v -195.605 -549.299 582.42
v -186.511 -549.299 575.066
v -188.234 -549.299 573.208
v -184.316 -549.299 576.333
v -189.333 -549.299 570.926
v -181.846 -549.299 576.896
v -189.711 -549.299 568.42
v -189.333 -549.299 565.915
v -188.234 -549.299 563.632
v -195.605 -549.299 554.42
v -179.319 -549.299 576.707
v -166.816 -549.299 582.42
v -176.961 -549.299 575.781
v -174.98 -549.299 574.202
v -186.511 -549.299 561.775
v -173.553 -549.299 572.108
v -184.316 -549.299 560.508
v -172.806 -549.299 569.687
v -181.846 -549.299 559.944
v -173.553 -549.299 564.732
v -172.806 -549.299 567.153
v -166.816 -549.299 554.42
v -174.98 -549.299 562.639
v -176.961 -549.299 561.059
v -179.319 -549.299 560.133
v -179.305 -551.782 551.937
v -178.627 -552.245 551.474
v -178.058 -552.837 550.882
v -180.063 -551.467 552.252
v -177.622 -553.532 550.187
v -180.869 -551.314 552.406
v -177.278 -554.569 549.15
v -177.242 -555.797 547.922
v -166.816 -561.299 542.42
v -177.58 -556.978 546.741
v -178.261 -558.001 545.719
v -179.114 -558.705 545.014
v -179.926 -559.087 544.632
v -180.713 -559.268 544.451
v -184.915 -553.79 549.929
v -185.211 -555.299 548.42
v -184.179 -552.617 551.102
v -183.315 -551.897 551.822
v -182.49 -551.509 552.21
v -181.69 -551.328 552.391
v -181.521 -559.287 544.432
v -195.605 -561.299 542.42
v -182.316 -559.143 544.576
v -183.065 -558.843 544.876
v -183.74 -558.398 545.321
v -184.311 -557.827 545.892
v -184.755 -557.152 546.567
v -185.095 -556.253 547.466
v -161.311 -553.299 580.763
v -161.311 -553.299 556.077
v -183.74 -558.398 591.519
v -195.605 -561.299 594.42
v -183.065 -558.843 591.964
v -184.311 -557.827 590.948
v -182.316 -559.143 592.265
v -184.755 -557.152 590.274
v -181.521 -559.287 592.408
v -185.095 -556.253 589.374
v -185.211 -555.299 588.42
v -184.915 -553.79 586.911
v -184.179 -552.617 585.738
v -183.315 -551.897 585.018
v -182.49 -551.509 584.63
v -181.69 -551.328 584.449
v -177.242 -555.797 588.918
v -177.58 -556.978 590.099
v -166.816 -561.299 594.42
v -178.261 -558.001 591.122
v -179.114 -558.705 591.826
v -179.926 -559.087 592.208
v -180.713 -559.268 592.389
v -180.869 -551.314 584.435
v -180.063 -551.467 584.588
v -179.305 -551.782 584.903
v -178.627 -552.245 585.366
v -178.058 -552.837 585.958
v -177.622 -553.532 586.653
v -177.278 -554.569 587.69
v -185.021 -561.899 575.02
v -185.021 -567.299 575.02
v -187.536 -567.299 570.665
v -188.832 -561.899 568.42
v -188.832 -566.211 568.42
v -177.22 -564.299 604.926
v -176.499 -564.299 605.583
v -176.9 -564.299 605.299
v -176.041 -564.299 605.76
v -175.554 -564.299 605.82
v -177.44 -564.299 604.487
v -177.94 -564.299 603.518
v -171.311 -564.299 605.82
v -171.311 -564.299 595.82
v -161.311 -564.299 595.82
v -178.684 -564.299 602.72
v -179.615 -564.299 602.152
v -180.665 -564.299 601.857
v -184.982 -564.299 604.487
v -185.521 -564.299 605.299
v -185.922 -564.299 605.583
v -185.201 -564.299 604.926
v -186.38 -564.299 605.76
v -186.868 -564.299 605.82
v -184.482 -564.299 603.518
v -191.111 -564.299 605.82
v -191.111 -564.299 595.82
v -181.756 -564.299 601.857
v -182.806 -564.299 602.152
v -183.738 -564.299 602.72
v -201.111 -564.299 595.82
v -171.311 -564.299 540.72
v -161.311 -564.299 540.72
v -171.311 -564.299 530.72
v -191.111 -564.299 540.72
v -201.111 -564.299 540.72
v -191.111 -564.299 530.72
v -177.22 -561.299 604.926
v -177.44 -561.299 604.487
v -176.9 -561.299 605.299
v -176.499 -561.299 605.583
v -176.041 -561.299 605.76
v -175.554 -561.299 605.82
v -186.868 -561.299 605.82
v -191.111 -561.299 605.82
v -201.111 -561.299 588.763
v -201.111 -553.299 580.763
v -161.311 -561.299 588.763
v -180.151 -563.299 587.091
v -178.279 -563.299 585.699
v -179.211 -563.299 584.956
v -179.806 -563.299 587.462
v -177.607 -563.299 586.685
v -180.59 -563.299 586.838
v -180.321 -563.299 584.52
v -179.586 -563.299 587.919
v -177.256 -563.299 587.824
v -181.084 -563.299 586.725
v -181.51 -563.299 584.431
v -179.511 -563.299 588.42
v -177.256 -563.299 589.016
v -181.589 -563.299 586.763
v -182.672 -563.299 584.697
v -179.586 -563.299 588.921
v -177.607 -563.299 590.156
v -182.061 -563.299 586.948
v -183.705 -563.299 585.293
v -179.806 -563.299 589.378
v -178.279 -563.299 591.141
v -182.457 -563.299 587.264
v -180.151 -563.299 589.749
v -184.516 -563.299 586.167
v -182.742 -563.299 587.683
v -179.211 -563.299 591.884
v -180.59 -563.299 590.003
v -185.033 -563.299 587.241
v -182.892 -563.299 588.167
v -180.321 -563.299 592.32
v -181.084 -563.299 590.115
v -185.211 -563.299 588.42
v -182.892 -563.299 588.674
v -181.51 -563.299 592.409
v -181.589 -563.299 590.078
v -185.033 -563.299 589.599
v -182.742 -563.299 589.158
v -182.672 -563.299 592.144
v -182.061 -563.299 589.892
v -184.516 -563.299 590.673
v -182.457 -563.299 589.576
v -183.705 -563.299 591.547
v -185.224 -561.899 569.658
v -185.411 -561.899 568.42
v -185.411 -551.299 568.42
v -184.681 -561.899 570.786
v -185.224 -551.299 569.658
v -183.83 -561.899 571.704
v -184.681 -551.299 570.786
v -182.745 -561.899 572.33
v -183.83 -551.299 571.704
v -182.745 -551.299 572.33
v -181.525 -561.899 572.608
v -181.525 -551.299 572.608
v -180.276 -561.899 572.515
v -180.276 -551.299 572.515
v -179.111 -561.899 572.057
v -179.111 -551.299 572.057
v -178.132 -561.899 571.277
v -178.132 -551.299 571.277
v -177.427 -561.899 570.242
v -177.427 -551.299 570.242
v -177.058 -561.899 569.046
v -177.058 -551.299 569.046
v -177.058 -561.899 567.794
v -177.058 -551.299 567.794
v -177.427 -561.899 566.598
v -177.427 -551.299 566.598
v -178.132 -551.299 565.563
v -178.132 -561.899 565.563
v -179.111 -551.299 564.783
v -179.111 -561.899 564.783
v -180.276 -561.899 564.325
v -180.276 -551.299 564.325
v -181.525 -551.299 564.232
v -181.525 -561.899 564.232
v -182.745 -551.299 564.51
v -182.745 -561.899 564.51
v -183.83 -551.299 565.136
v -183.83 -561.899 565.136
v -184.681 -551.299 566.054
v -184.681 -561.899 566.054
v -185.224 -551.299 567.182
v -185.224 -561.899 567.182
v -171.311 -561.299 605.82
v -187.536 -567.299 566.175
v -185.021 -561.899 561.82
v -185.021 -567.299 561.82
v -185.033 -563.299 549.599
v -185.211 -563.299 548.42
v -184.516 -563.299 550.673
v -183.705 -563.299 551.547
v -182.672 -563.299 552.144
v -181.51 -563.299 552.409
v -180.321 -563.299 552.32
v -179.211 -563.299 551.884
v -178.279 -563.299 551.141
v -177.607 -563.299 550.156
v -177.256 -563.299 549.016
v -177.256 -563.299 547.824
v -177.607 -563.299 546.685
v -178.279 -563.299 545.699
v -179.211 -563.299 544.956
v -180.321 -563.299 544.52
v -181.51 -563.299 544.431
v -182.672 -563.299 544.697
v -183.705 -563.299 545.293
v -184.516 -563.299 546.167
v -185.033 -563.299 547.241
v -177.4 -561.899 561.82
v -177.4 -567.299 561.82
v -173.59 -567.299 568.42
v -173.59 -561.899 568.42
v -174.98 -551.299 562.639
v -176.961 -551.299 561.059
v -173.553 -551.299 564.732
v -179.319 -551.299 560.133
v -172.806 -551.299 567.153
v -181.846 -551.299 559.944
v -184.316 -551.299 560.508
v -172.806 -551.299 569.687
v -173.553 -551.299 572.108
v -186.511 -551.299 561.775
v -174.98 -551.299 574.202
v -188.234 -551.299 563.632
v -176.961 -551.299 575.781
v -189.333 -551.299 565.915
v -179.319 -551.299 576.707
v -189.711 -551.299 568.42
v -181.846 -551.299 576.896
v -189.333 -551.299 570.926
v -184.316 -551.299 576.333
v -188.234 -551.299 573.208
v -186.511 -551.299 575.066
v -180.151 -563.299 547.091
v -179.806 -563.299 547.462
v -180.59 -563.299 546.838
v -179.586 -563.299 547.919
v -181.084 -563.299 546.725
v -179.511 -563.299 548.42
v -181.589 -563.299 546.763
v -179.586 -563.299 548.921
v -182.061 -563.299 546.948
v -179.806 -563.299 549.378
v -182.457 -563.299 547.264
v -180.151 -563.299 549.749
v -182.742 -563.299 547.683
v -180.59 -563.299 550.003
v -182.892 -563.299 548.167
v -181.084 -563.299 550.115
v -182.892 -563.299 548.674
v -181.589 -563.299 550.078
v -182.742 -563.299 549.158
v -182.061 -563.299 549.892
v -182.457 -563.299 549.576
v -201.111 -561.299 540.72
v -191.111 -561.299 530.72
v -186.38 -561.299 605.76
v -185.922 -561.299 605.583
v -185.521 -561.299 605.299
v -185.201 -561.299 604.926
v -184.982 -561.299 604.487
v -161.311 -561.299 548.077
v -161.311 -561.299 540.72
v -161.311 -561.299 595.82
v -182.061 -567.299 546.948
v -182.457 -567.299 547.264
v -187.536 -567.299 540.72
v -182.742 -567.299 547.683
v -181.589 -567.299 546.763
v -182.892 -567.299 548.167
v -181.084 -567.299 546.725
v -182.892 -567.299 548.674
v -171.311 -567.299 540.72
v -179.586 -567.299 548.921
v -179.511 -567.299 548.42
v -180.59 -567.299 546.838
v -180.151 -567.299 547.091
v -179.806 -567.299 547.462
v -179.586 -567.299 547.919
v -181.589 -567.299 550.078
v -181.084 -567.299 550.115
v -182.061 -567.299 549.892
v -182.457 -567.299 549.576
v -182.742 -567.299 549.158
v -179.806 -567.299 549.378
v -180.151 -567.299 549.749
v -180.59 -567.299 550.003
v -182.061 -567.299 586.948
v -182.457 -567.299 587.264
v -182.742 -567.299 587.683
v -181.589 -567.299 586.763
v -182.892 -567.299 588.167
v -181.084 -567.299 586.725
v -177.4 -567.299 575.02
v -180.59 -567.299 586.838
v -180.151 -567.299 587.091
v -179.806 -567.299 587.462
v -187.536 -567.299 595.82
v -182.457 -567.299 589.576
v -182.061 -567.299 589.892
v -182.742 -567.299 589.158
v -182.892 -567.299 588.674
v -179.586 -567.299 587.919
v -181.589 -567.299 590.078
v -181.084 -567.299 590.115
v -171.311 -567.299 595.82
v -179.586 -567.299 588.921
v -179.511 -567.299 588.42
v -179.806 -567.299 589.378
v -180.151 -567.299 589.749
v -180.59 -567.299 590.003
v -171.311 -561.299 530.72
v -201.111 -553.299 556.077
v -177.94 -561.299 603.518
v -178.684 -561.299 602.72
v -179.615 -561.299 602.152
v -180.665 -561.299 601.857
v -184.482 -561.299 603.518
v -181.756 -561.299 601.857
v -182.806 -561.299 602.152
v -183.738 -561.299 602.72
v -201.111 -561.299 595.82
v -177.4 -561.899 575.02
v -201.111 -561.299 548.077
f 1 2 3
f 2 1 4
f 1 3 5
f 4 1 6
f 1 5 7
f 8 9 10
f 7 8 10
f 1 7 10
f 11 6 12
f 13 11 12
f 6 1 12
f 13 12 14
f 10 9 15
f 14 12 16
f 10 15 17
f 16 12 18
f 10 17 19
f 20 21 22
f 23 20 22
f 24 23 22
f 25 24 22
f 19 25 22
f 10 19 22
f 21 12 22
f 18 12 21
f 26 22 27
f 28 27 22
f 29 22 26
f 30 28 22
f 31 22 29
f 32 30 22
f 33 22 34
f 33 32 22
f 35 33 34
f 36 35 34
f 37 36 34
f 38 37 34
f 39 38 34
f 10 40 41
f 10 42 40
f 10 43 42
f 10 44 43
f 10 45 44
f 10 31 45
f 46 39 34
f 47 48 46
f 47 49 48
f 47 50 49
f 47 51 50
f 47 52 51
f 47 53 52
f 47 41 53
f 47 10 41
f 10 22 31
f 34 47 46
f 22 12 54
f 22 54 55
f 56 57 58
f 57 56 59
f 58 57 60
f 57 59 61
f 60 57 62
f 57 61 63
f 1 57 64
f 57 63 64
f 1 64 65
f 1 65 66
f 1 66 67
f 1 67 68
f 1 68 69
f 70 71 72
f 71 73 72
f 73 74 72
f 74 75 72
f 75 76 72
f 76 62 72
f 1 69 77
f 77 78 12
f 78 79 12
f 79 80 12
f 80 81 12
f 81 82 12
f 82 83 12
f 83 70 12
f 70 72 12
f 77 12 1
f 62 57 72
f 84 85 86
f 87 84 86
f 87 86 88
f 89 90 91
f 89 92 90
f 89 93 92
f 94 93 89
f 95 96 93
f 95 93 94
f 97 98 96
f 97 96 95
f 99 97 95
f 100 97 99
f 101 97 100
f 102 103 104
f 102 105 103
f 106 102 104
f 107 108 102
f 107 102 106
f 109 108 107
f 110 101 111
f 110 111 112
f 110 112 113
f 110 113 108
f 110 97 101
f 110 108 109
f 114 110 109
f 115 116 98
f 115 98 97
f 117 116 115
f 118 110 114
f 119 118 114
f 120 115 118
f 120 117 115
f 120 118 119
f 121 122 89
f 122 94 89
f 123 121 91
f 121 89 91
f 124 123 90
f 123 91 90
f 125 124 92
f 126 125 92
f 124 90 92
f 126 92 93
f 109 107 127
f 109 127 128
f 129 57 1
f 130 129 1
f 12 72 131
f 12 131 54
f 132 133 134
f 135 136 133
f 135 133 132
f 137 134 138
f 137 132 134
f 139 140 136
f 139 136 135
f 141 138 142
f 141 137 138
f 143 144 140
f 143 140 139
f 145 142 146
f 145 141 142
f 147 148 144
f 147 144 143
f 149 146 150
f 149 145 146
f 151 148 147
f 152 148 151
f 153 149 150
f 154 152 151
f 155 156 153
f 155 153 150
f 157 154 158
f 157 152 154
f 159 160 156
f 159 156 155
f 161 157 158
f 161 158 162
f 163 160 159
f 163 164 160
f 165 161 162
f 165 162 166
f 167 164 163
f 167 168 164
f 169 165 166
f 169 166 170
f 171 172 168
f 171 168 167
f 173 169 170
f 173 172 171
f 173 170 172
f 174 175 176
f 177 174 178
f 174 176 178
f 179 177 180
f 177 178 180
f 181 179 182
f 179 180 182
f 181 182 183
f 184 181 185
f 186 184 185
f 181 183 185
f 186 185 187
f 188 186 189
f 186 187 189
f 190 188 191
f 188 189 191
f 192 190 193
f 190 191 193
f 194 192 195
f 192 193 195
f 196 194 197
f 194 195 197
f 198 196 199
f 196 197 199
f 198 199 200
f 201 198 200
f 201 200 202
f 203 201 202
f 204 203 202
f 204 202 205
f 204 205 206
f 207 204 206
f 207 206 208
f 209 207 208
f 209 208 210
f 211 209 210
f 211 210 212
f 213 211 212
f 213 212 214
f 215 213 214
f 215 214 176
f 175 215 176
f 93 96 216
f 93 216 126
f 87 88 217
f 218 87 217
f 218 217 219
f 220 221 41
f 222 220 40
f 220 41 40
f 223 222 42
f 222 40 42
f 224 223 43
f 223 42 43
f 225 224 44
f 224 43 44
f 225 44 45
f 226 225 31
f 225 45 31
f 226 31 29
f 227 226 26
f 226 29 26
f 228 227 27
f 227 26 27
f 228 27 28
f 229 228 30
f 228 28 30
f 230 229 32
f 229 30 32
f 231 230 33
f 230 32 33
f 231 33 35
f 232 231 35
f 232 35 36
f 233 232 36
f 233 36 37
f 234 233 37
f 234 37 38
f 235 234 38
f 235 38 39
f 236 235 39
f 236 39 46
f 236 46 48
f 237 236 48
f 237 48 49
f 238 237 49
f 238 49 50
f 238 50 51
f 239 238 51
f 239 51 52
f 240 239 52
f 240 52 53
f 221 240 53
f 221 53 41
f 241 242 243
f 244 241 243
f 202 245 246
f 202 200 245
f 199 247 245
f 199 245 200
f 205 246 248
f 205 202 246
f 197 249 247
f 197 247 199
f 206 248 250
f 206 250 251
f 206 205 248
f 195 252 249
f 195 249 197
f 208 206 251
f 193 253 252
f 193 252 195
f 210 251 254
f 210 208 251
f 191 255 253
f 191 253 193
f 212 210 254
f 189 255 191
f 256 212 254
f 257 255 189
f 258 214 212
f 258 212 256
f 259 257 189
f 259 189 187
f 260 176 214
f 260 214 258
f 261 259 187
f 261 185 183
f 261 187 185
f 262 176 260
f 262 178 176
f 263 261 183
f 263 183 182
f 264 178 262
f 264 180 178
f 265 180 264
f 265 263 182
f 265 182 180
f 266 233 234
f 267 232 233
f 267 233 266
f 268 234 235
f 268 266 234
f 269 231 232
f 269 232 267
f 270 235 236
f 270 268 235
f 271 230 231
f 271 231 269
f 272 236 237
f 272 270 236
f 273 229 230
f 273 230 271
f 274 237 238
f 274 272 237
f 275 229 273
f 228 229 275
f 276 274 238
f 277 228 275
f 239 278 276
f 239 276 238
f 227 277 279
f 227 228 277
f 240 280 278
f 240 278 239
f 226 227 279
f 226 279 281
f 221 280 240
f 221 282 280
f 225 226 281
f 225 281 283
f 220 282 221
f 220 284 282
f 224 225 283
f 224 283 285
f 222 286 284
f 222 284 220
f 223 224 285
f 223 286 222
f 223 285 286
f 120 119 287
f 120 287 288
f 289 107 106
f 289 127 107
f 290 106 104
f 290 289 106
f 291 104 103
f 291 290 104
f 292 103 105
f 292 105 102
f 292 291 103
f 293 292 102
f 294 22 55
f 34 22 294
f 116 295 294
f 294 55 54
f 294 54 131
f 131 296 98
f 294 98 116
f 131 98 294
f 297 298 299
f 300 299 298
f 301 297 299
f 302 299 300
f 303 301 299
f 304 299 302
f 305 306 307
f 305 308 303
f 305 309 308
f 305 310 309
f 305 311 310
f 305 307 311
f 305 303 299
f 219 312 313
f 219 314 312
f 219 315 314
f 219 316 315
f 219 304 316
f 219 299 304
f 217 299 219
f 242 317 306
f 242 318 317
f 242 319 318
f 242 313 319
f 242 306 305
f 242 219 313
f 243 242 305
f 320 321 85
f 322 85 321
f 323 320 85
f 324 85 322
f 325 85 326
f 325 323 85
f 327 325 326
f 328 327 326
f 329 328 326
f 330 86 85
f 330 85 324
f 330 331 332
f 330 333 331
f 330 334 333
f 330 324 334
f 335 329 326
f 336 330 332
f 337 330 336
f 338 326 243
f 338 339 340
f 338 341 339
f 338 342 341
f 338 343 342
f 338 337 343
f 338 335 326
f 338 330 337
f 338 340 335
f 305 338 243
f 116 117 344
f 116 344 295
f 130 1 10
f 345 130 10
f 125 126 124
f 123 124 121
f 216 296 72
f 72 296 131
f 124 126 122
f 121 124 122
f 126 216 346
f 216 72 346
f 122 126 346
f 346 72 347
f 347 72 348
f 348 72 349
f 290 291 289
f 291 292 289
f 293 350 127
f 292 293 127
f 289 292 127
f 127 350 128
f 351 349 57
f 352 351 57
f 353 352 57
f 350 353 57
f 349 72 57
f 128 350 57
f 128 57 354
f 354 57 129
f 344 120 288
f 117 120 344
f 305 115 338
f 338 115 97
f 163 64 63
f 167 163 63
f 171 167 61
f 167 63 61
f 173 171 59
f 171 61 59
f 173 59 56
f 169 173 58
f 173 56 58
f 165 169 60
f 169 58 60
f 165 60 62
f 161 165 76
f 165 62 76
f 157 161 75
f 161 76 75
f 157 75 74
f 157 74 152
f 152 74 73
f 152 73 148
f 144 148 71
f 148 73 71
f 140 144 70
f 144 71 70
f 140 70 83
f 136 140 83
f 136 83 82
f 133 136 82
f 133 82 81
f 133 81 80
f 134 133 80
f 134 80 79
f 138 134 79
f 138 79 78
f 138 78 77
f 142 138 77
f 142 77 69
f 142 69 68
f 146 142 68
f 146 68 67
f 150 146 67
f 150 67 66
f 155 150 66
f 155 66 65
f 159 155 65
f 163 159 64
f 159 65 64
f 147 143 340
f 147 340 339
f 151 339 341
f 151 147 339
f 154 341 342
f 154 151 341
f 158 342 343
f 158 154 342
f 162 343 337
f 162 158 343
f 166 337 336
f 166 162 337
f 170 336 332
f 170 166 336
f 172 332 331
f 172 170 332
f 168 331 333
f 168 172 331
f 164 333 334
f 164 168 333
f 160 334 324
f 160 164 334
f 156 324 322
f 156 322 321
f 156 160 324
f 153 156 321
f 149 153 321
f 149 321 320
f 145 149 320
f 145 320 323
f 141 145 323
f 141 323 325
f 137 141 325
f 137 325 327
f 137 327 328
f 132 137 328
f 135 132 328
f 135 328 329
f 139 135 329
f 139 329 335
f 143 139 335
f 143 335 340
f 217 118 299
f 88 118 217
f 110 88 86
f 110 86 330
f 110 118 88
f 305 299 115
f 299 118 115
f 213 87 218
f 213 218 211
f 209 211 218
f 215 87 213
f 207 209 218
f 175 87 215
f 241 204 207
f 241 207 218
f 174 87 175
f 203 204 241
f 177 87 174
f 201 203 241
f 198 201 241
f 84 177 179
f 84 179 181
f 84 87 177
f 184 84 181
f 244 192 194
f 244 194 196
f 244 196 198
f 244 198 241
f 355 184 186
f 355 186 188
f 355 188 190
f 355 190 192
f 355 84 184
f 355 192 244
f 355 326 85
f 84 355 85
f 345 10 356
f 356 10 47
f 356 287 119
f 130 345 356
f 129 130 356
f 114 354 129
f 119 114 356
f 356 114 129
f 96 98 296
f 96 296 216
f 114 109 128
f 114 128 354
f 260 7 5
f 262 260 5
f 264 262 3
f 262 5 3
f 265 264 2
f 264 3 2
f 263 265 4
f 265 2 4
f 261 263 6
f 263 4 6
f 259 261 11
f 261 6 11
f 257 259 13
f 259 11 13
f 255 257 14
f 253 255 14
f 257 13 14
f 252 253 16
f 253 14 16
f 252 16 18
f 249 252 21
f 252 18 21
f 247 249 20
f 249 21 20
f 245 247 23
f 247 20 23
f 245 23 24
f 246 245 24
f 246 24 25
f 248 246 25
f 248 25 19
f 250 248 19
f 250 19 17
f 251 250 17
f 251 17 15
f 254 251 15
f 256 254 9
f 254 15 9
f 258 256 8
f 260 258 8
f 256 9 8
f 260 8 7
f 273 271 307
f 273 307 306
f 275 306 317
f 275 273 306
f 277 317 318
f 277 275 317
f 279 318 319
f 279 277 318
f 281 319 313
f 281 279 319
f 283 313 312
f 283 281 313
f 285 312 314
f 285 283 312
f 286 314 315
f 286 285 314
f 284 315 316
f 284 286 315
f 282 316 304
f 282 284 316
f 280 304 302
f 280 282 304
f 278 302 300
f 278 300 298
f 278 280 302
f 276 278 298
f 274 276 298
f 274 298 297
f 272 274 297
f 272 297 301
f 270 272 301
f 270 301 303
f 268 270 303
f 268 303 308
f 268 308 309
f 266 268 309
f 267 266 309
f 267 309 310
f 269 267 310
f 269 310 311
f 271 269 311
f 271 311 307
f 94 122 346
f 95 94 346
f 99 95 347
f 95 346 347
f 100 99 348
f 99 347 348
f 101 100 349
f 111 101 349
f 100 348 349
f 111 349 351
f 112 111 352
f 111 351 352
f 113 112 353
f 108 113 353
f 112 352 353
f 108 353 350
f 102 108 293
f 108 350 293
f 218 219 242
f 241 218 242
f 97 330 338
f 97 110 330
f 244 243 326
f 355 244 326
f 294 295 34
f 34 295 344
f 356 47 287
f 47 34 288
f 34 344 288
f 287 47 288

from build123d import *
from OCP.BRepFilletAPI import BRepFilletAPI_MakeChamfer

# Parameters (mm, degrees)
SKETCH1_W           = 12.900022784
SKETCH1_H           = 55.1
SKETCH1_R           = 1.7
SKETCH1_W_2         = 6.899977216
BOSS_EXTRUDE1_DEPTH = 6
SKETCH2_R           = 2.1
BOSS_EXTRUDE2_DEPTH = 3
CHAMFER2_SIZE2      = 3
CHAMFER2_SIZE       = 3.575260778
SKETCH3_W           = 39.8
SKETCH3_H           = 24
BOSS_EXTRUDE3_DEPTH = 12
SKETCH5_R           = 4.2
CUT_EXTRUDE2_DEPTH  = 34
SKETCH7_R           = 4
CUT_EXTRUDE4_DEPTH  = 2
SKETCH10_R          = 4
CUT_EXTRUDE5_DEPTH  = 6
FILLET2_R           = 2
CUT_EXTRUDE6_DEPTH  = 5.4
CHAMFER3_SIZE       = 14
CHAMFER4_SIZE       = 4
CHAMFER4_SIZE2      = 5.505527682
SKETCH12_R          = 8.5
CUT_EXTRUDE7_DEPTH  = 2


# Some blends are built 0.0001 mm under size
with BuildPart() as part:
    # Sketch1 → Boss-Extrude1 (new body)
    # profile 1 of 2: a face of its own
    with BuildSketch(Plane.XZ.offset(561.298939869)):
        with Locations((-177.760855006, 568.270141885)):
            Rectangle(SKETCH1_W, SKETCH1_H)
        with Locations((-181.210843614, 548.420141885)):
            Circle(SKETCH1_R, mode=Mode.SUBTRACT)
        with Locations((-181.210843614, 588.420141885)):
            Circle(SKETCH1_R, mode=Mode.SUBTRACT)
    # profile 2 of 2: a face of its own
    with BuildSketch(Plane.XZ.offset(561.298939869)):
        with Locations((-187.660855006, 568.270141885)):
            Rectangle(SKETCH1_W_2, SKETCH1_H)
    extrude(amount=BOSS_EXTRUDE1_DEPTH)

    # Sketch2 → Boss-Extrude2 (add)
    with BuildSketch(Plane(origin=(0, -564.298939869, 0), x_dir=(1, 0, 0), z_dir=(0, 1, 0))):
        Polygon((-191.110843614, -530.720141885), (-171.310843614, -530.720141885), (-161.310843614, -540.720141885), (-161.310843614, -595.820141885), (-171.310843614, -605.820141885), (-191.110843614, -605.820141885), (-201.110843614, -595.820141885), (-201.110843614, -540.720141885), align=None)
        with Locations((-181.210843614, -548.420141885)):
            Circle(SKETCH2_R, mode=Mode.SUBTRACT)
        with Locations((-181.210843614, -588.420141885)):
            Circle(SKETCH2_R, mode=Mode.SUBTRACT)
    extrude(amount=BOSS_EXTRUDE2_DEPTH)

    # Chamfer2
    chamfer2_edges = [part.edges().sort_by_distance(p)[0] for p in [
        (-191.110843614, -567.298939869, 568.270141885),
    ]]
    chamfer2_side = [part.faces().sort_by_distance(p)[0] for p in [
        (-191.050843614, -567.298939869, 568.270141885),
    ]]
    chamfer(chamfer2_edges, length=CHAMFER2_SIZE - 0.0001, length2=CHAMFER2_SIZE2 - 0.0001, reference=chamfer2_side[0])  # a hair under: the kernel refuses the full size

    # Sketch3 → Boss-Extrude3 (add)
    with BuildSketch(Plane(origin=(0, -561.298939869, 0), x_dir=(1, 0, 0), z_dir=(0, 1, 0))):
        with Locations((-181.210843614, -568.420141885)):
            Rectangle(SKETCH3_W, SKETCH3_H)
    extrude(amount=BOSS_EXTRUDE3_DEPTH)

    # Sketch5 → Cut-Extrude2 (cut)
    with BuildSketch(Plane(origin=(0, -549.298939869, 0), x_dir=(1, 0, 0), z_dir=(0, 1, 0))):
        with Locations(Location((-181.210843614, -568.420141885, 0), (0, 0, 180))):
            Circle(SKETCH5_R)
    extrude(amount=-CUT_EXTRUDE2_DEPTH, mode=Mode.SUBTRACT)

    # Sketch7 → Cut-Extrude4 (cut)
    with BuildSketch(Plane(origin=(0, -561.298939869, 0), x_dir=(1, 0, 0), z_dir=(0, 1, 0))):
        with Locations(Location((-181.210843614, -548.420141885, 0), (0, 0, 180))):
            Circle(SKETCH7_R)
        with Locations(Location((-181.210843614, -588.420141885, 0), (0, 0, 180))):
            Circle(SKETCH7_R)
    extrude(amount=-CUT_EXTRUDE4_DEPTH, mode=Mode.SUBTRACT)

    # Sketch10 → Cut-Extrude5 (cut)
    with BuildSketch(Plane(origin=(0, -561.298939869, 0), x_dir=(1, 0, 0), z_dir=(0, 1, 0))):
        with Locations((-181.210843614, -605.820141885)):
            Circle(SKETCH10_R)
    extrude(amount=-CUT_EXTRUDE5_DEPTH, mode=Mode.SUBTRACT)

    # Fillet2
    fillet2_edges = [part.edges().sort_by_distance(p)[0] for p in [
        (-177.210843614, -562.798939869, 605.820141885),
        (-185.210843614, -562.798939869, 605.820141885),
    ]]
    fillet(fillet2_edges, radius=FILLET2_R)

    # Sketch11 → Cut-Extrude6 (cut)
    with BuildSketch(Plane.XZ.offset(567.298939869)):
        Polygon((-185.02135539, 575.020141885), (-188.831867167, 568.420141885), (-185.02135539, 561.820141885), (-177.400331837, 561.820141885), (-173.58982006, 568.420141885), (-177.400331837, 575.020141885), align=None)
    extrude(amount=-CUT_EXTRUDE6_DEPTH, mode=Mode.SUBTRACT)

    # Chamfer3
    # the kernel refuses this chamfer: 14 mm, written as the material it adds along each edge
    with BuildSketch(Plane(origin=(-161.310843614, -561.298939869, 580.420141885), x_dir=(0, -0.027495876610589963, 0.9996219169112966), z_dir=(-1, 0, 0))) as chamfer3_piece_1_section:
        Polygon((CHAMFER3_SIZE * 0.999621916911, CHAMFER3_SIZE * 0.0274958766106), (-CHAMFER3_SIZE * 0.0274958766106, CHAMFER3_SIZE * 0.999621916911), (0, 0), align=None)
    chamfer3_piece_1 = extrude(amount=39.8, mode=Mode.PRIVATE)
    chamfer3_piece_1 = chamfer3_piece_1 - Plane(origin=(-181.210843614, -559.739674618, 588.420141885), x_dir=(-1, 0, 0), z_dir=(0, 1, 0)) * Cylinder(4, 136, mode=Mode.PRIVATE)
    chamfer3_piece_1 = split(chamfer3_piece_1, bisect_by=Plane(origin=(-194.47751028, -549.298939869, 592.639373465), z_dir=(0, -1, 0)), keep=Keep.TOP, mode=Mode.PRIVATE)
    add(chamfer3_piece_1)
    with BuildSketch(Plane(origin=(-201.110843614, -561.298939869, 556.420141885), x_dir=(3.206917197373746e-15, 0.9996219169112968, 0.027495876610589966), z_dir=(1, 0, 0))) as chamfer3_piece_2_section:
        Polygon((CHAMFER3_SIZE * 0.999621916911, -CHAMFER3_SIZE * 0.0274958766106), (-CHAMFER3_SIZE * 0.0274958766106, -CHAMFER3_SIZE * 0.999621916911), (0, 0), align=None)
    chamfer3_piece_2 = extrude(amount=39.8, mode=Mode.PRIVATE)
    chamfer3_piece_2 = split(chamfer3_piece_2, bisect_by=Plane(origin=(-167.944176947, -549.298939869, 552.464896655), z_dir=(0, -1, 0)), keep=Keep.TOP, mode=Mode.PRIVATE)
    chamfer3_piece_2 = chamfer3_piece_2 - Plane(origin=(-181.210843614, -551.475687905, 548.420141885), x_dir=(-1, 0, 0), z_dir=(0, 1, 0)) * Cylinder(4, 136, mode=Mode.PRIVATE)
    add(chamfer3_piece_2)

    # Chamfer4: one chamfer whose edges measure the first distance from different faces: ONE call of the kernel's chamfer builder (chamfer() names one face for all edges)
    chamfer4_edges_1 = [part.edges().sort_by_distance(p)[0] for p in [
        (-161.310843614, -555.298939869, 588.420141885),
        (-161.310843614, -555.298939869, 548.420141885),
        (-161.310843614, -549.298939869, 568.420141885),
    ]]
    chamfer4_side_1 = [part.faces().sort_by_distance(p)[0] for p in [
        (-161.310843614, -557.666443356, 568.381717896),
    ]]
    chamfer4_edges_2 = [part.edges().sort_by_distance(p)[0] for p in [
        (-201.110843614, -555.298939869, 588.420141885),
        (-201.110843614, -555.298939869, 548.420141885),
        (-201.110843614, -549.298939869, 568.420141885),
    ]]
    chamfer4_side_2 = [part.faces().sort_by_distance(p)[0] for p in [
        (-201.110843614, -557.666443356, 568.381717896),
    ]]
    chamfer4 = BRepFilletAPI_MakeChamfer(part.part.solid().wrapped)
    for e in chamfer4_edges_1:
        chamfer4.Add(CHAMFER4_SIZE, CHAMFER4_SIZE2, e.wrapped, chamfer4_side_1[0].wrapped)  # the first distance lies on this face
    for e in chamfer4_edges_2:
        chamfer4.Add(CHAMFER4_SIZE, CHAMFER4_SIZE2, e.wrapped, chamfer4_side_2[0].wrapped)  # the first distance lies on this face
    add(Compound.cast(chamfer4.Shape()), mode=Mode.REPLACE)

    # Sketch12 → Cut-Extrude7 (cut)
    with BuildSketch(Plane(origin=(0, -549.298939869, 0), x_dir=(1, 0, 0), z_dir=(0, 1, 0))):
        with Locations(Location((-181.210843614, -568.420141885, 0), (0, 0, 180))):
            Circle(SKETCH12_R)
    extrude(amount=-CUT_EXTRUDE7_DEPTH, mode=Mode.SUBTRACT)


solid = part.part
